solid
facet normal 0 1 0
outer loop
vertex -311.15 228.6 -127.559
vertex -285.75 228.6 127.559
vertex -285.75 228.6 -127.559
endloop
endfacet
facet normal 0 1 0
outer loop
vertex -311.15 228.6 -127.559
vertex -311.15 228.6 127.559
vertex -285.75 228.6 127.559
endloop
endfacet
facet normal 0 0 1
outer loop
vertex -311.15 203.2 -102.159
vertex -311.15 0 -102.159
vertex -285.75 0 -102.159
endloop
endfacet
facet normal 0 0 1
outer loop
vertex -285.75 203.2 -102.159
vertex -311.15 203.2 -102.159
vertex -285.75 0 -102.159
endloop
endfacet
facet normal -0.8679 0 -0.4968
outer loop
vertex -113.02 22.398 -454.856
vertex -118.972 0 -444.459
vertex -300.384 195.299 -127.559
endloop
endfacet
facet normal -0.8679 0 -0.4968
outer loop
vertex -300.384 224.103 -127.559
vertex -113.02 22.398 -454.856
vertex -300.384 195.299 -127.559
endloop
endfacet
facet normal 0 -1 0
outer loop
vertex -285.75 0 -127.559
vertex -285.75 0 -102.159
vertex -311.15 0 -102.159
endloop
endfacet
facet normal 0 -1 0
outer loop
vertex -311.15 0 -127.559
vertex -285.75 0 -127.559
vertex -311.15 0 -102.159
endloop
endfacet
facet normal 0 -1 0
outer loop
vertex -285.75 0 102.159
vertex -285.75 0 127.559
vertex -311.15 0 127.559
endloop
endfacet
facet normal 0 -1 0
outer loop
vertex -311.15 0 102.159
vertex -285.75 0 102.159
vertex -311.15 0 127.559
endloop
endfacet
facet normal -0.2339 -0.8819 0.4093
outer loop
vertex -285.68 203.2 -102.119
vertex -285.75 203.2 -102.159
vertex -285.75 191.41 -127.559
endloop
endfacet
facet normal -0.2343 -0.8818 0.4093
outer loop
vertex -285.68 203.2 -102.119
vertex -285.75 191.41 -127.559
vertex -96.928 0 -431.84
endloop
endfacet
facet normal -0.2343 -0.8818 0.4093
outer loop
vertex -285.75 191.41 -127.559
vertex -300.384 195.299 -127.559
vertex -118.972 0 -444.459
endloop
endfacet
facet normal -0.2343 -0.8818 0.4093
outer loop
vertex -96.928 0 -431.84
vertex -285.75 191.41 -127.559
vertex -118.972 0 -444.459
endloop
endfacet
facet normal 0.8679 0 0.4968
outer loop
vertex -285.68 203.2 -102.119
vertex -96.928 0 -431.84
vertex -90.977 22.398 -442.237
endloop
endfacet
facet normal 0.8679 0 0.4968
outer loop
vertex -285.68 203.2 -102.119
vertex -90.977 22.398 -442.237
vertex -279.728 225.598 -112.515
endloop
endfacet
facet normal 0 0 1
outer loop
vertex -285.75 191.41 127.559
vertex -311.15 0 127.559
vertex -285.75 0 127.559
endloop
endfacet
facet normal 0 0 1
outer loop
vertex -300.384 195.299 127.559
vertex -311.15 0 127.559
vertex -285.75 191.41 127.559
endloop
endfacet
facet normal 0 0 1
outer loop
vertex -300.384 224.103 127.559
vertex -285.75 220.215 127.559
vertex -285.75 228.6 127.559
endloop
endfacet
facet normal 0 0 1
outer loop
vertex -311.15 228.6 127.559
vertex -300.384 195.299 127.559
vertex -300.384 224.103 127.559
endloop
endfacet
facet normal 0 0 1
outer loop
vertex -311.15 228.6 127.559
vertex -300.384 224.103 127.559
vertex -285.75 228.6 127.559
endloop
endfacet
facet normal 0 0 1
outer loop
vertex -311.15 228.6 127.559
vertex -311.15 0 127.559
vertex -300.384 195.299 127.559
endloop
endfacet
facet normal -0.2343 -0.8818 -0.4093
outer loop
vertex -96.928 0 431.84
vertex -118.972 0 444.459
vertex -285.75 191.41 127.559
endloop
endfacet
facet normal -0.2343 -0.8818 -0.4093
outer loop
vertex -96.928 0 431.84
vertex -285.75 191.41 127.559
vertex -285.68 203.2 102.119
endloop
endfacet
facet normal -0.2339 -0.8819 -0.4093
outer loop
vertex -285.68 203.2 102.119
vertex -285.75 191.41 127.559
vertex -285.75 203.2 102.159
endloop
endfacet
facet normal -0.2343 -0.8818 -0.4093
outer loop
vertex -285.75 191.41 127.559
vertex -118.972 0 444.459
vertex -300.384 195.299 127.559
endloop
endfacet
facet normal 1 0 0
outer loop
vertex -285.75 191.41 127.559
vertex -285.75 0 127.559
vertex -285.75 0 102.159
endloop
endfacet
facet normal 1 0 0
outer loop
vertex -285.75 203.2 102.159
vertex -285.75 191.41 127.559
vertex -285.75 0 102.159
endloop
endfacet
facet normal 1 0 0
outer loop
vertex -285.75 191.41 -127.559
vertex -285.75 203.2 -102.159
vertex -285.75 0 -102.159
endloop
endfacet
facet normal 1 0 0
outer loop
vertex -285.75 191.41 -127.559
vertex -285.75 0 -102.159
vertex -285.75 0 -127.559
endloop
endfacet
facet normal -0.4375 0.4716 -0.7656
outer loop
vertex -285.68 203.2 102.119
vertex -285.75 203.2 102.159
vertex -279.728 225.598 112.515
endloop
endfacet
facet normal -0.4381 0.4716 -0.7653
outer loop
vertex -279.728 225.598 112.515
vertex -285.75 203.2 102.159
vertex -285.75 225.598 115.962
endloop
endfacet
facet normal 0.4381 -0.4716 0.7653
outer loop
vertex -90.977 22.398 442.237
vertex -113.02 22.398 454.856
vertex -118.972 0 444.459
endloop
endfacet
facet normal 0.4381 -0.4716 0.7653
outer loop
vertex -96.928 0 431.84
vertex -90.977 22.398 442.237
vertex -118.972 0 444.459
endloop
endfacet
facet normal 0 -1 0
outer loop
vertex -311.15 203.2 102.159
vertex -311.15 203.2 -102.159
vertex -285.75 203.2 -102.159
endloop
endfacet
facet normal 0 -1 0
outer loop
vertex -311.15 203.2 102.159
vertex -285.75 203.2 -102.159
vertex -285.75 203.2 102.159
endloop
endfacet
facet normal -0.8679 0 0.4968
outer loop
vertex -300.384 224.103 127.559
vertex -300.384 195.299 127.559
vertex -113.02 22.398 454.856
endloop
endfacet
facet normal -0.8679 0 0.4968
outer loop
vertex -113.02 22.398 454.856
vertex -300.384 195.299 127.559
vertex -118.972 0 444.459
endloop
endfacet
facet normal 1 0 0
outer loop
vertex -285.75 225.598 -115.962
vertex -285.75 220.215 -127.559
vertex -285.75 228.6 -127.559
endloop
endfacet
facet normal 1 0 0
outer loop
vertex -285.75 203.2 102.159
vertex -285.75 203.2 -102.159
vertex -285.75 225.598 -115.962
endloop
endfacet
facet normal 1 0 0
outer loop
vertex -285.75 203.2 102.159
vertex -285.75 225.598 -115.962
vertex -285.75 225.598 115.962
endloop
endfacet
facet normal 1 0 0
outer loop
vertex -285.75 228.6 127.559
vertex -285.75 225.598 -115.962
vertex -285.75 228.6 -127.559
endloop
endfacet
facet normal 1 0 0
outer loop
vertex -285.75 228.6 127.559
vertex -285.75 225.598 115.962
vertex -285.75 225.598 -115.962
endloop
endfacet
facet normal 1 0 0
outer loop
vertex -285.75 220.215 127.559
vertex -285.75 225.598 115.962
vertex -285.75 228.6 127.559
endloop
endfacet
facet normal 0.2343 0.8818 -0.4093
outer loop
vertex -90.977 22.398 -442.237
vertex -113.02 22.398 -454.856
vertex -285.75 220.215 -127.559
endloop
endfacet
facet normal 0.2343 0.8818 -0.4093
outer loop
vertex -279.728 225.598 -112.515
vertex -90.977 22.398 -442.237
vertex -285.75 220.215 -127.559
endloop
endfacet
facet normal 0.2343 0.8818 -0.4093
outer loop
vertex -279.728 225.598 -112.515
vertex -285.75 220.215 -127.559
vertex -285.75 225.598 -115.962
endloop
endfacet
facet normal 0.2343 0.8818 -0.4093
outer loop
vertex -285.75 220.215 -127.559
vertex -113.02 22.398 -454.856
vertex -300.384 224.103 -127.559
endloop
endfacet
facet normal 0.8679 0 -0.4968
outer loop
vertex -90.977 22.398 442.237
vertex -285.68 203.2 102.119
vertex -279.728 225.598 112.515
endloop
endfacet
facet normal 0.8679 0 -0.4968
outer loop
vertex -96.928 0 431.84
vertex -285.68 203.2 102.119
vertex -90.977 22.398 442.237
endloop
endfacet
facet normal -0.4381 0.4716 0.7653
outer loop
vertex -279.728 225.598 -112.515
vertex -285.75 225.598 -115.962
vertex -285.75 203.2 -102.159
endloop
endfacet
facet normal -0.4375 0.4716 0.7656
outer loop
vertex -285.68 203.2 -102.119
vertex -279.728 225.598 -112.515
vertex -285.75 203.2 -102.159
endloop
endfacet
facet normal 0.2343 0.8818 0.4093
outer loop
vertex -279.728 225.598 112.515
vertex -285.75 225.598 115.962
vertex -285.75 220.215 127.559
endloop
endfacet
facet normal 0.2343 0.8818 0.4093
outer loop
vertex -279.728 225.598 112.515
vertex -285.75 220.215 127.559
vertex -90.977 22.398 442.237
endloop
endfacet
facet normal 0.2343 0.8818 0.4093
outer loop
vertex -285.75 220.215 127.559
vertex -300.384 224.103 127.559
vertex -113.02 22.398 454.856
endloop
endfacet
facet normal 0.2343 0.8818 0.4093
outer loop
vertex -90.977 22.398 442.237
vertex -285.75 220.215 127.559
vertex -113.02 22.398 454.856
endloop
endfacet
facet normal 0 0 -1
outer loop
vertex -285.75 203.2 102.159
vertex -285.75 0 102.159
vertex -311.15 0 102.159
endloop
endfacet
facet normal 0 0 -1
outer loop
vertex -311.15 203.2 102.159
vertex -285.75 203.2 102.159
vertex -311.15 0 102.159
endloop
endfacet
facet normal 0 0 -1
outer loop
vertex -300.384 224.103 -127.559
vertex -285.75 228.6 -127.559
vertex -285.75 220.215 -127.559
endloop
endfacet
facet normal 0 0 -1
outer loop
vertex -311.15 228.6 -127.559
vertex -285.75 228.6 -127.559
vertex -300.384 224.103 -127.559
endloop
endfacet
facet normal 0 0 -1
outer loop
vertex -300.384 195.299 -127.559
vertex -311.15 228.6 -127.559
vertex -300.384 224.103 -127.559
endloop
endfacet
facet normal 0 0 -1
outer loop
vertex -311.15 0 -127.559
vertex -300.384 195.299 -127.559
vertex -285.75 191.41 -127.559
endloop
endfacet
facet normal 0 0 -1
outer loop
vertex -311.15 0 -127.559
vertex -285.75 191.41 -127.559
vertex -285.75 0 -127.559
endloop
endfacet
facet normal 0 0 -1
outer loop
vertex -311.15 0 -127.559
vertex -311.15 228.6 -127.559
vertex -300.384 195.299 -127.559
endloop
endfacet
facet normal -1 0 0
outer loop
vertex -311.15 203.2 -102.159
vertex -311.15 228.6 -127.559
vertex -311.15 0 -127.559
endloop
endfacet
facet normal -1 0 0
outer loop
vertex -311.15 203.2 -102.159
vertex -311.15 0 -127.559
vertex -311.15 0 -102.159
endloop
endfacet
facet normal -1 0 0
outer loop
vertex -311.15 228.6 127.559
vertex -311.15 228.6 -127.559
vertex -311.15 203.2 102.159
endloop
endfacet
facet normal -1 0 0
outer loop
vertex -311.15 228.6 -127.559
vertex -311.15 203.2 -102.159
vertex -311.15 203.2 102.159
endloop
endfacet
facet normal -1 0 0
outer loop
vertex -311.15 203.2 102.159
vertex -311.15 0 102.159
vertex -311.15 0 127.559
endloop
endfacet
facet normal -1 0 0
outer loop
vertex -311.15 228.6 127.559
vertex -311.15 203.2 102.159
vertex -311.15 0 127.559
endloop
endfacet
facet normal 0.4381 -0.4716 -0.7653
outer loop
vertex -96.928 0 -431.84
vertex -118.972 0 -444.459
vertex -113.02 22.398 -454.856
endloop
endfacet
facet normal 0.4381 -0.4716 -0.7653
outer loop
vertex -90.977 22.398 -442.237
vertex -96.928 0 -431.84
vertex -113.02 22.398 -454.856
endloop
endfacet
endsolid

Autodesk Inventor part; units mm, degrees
ref_plane "YZ Plane" through (0, 0, 0) normal (1, 0, 0) x (0, 1, 0)
ref_plane "XZ Plane" through (0, 0, 0) normal (0, 1, 0) x (-1, 0, 0)
ref_plane "XY Plane" through (0, 0, 0) normal (0, 0, 1) x (1, 0, 0)
sketch "Sketch3" plane through (0, 0, 0) normal (0, 1, 0) x (-1, 0, 0)
  line L0 (311.15, 438.15) -> (-311.15, 438.15) construction
  line L1 (-311.15, 438.15) -> (-311.15, -438.15) construction
  line L2 (-311.15, -438.15) -> (311.15, -438.15) construction
  line L3 (311.15, -438.15) -> (311.15, 438.15) construction
  line L4 (0, -613.41) -> (0, 613.41) construction
  line L5 (435.61, 0) -> (-435.61, 0) construction
  line L6 (107.95, 438.15) -> (107.95, -438.15) construction
  line L7 (311.15, 102.1588) -> (-311.15, 102.1588) construction
  line L8 (311.15, -102.1588) -> (-311.15, -102.1588) construction
  line L9 (311.15, 127.5588) -> (285.75, 127.5588)
  line L10 (285.75, 127.5588) -> (285.75, 102.1588)
  line L11 (285.75, 102.1588) -> (311.15, 102.1588)
  line L12 (311.15, 102.1588) -> (311.15, 127.5588)
  line L13 (311.15, -102.1588) -> (285.75, -102.1588)
  line L14 (285.75, -102.1588) -> (285.75, -127.5588)
  line L15 (285.75, -127.5588) -> (311.15, -127.5588)
  line L16 (311.15, -127.5588) -> (311.15, -102.1588)
  point P0 (0, 0)
  dimension "d8" = 876.3
  dimension "d9" = 622.3
  dimension "d10" = 203.2
  dimension "d11" = 204.3176
  dimension "d12" = 25.4
  dimension "d13" = 25.4
  dimension "d14" = 25.4
  dimension "d15" = 25.4
extrude "Extrusion1" add sketch "Sketch3" along normal blind 203.2
ref_plane "Work Plane1" through (-285.75, 203.2, 127.5588) normal (0.8678585, 0, -0.4968114) x (0.4320296, -0.4937482, 0.7546941)
sketch "Sketch4" plane through (-285.75, 203.2, 127.5588) normal (0.8678585, 0, -0.4968114) x (0.4320296, -0.4937482, 0.7546941)
  line L0 (-19.8109, -14.5079) -> (410.9042, -25.3919)
  line L1 (410.9042, -25.3919) -> (411.5458, 0)
  line L2 (411.5458, 0) -> (-19.1692, 10.884)
  line L3 (-19.1692, 10.884) -> (-19.8109, -14.5079)
  line L4 (323.7574, 49.8449) -> (592.6095, -102.8051) construction
  line L5 (411.5458, 0) -> (-249.7926, 375.4977) construction
  point P0 (127.5142, 161.2687)
  dimension "d18" = 25.4
extrude "Extrusion2" add sketch "Sketch4" along normal mid plane 25.4
mirror "Mirror1" about plane through (0, 0, 0) normal (0, 0, 1) of "Extrusion2"
ref_plane "Work Plane2" through (-311.15, 203.2, -127.5588) normal (1, 0, 0) x (0, 0, 1)
sketch "Sketch5" plane through (-311.15, 203.2, -127.5588) normal (1, 0, 0) x (0, 0, 1)
  line L0 (0, 0) -> (255.1176, 0)
  line L1 (255.1176, 0) -> (255.1176, -25.4)
  line L2 (255.1176, -25.4) -> (0, -25.4)
  line L3 (0, -25.4) -> (0, 0)
  point P0 (127.5588, 203.2)
  dimension "d21" = 25.4
extrude "Extrusion3" add sketch "Sketch5" along normal blind 25.4
properties part number "Roll Bar"
